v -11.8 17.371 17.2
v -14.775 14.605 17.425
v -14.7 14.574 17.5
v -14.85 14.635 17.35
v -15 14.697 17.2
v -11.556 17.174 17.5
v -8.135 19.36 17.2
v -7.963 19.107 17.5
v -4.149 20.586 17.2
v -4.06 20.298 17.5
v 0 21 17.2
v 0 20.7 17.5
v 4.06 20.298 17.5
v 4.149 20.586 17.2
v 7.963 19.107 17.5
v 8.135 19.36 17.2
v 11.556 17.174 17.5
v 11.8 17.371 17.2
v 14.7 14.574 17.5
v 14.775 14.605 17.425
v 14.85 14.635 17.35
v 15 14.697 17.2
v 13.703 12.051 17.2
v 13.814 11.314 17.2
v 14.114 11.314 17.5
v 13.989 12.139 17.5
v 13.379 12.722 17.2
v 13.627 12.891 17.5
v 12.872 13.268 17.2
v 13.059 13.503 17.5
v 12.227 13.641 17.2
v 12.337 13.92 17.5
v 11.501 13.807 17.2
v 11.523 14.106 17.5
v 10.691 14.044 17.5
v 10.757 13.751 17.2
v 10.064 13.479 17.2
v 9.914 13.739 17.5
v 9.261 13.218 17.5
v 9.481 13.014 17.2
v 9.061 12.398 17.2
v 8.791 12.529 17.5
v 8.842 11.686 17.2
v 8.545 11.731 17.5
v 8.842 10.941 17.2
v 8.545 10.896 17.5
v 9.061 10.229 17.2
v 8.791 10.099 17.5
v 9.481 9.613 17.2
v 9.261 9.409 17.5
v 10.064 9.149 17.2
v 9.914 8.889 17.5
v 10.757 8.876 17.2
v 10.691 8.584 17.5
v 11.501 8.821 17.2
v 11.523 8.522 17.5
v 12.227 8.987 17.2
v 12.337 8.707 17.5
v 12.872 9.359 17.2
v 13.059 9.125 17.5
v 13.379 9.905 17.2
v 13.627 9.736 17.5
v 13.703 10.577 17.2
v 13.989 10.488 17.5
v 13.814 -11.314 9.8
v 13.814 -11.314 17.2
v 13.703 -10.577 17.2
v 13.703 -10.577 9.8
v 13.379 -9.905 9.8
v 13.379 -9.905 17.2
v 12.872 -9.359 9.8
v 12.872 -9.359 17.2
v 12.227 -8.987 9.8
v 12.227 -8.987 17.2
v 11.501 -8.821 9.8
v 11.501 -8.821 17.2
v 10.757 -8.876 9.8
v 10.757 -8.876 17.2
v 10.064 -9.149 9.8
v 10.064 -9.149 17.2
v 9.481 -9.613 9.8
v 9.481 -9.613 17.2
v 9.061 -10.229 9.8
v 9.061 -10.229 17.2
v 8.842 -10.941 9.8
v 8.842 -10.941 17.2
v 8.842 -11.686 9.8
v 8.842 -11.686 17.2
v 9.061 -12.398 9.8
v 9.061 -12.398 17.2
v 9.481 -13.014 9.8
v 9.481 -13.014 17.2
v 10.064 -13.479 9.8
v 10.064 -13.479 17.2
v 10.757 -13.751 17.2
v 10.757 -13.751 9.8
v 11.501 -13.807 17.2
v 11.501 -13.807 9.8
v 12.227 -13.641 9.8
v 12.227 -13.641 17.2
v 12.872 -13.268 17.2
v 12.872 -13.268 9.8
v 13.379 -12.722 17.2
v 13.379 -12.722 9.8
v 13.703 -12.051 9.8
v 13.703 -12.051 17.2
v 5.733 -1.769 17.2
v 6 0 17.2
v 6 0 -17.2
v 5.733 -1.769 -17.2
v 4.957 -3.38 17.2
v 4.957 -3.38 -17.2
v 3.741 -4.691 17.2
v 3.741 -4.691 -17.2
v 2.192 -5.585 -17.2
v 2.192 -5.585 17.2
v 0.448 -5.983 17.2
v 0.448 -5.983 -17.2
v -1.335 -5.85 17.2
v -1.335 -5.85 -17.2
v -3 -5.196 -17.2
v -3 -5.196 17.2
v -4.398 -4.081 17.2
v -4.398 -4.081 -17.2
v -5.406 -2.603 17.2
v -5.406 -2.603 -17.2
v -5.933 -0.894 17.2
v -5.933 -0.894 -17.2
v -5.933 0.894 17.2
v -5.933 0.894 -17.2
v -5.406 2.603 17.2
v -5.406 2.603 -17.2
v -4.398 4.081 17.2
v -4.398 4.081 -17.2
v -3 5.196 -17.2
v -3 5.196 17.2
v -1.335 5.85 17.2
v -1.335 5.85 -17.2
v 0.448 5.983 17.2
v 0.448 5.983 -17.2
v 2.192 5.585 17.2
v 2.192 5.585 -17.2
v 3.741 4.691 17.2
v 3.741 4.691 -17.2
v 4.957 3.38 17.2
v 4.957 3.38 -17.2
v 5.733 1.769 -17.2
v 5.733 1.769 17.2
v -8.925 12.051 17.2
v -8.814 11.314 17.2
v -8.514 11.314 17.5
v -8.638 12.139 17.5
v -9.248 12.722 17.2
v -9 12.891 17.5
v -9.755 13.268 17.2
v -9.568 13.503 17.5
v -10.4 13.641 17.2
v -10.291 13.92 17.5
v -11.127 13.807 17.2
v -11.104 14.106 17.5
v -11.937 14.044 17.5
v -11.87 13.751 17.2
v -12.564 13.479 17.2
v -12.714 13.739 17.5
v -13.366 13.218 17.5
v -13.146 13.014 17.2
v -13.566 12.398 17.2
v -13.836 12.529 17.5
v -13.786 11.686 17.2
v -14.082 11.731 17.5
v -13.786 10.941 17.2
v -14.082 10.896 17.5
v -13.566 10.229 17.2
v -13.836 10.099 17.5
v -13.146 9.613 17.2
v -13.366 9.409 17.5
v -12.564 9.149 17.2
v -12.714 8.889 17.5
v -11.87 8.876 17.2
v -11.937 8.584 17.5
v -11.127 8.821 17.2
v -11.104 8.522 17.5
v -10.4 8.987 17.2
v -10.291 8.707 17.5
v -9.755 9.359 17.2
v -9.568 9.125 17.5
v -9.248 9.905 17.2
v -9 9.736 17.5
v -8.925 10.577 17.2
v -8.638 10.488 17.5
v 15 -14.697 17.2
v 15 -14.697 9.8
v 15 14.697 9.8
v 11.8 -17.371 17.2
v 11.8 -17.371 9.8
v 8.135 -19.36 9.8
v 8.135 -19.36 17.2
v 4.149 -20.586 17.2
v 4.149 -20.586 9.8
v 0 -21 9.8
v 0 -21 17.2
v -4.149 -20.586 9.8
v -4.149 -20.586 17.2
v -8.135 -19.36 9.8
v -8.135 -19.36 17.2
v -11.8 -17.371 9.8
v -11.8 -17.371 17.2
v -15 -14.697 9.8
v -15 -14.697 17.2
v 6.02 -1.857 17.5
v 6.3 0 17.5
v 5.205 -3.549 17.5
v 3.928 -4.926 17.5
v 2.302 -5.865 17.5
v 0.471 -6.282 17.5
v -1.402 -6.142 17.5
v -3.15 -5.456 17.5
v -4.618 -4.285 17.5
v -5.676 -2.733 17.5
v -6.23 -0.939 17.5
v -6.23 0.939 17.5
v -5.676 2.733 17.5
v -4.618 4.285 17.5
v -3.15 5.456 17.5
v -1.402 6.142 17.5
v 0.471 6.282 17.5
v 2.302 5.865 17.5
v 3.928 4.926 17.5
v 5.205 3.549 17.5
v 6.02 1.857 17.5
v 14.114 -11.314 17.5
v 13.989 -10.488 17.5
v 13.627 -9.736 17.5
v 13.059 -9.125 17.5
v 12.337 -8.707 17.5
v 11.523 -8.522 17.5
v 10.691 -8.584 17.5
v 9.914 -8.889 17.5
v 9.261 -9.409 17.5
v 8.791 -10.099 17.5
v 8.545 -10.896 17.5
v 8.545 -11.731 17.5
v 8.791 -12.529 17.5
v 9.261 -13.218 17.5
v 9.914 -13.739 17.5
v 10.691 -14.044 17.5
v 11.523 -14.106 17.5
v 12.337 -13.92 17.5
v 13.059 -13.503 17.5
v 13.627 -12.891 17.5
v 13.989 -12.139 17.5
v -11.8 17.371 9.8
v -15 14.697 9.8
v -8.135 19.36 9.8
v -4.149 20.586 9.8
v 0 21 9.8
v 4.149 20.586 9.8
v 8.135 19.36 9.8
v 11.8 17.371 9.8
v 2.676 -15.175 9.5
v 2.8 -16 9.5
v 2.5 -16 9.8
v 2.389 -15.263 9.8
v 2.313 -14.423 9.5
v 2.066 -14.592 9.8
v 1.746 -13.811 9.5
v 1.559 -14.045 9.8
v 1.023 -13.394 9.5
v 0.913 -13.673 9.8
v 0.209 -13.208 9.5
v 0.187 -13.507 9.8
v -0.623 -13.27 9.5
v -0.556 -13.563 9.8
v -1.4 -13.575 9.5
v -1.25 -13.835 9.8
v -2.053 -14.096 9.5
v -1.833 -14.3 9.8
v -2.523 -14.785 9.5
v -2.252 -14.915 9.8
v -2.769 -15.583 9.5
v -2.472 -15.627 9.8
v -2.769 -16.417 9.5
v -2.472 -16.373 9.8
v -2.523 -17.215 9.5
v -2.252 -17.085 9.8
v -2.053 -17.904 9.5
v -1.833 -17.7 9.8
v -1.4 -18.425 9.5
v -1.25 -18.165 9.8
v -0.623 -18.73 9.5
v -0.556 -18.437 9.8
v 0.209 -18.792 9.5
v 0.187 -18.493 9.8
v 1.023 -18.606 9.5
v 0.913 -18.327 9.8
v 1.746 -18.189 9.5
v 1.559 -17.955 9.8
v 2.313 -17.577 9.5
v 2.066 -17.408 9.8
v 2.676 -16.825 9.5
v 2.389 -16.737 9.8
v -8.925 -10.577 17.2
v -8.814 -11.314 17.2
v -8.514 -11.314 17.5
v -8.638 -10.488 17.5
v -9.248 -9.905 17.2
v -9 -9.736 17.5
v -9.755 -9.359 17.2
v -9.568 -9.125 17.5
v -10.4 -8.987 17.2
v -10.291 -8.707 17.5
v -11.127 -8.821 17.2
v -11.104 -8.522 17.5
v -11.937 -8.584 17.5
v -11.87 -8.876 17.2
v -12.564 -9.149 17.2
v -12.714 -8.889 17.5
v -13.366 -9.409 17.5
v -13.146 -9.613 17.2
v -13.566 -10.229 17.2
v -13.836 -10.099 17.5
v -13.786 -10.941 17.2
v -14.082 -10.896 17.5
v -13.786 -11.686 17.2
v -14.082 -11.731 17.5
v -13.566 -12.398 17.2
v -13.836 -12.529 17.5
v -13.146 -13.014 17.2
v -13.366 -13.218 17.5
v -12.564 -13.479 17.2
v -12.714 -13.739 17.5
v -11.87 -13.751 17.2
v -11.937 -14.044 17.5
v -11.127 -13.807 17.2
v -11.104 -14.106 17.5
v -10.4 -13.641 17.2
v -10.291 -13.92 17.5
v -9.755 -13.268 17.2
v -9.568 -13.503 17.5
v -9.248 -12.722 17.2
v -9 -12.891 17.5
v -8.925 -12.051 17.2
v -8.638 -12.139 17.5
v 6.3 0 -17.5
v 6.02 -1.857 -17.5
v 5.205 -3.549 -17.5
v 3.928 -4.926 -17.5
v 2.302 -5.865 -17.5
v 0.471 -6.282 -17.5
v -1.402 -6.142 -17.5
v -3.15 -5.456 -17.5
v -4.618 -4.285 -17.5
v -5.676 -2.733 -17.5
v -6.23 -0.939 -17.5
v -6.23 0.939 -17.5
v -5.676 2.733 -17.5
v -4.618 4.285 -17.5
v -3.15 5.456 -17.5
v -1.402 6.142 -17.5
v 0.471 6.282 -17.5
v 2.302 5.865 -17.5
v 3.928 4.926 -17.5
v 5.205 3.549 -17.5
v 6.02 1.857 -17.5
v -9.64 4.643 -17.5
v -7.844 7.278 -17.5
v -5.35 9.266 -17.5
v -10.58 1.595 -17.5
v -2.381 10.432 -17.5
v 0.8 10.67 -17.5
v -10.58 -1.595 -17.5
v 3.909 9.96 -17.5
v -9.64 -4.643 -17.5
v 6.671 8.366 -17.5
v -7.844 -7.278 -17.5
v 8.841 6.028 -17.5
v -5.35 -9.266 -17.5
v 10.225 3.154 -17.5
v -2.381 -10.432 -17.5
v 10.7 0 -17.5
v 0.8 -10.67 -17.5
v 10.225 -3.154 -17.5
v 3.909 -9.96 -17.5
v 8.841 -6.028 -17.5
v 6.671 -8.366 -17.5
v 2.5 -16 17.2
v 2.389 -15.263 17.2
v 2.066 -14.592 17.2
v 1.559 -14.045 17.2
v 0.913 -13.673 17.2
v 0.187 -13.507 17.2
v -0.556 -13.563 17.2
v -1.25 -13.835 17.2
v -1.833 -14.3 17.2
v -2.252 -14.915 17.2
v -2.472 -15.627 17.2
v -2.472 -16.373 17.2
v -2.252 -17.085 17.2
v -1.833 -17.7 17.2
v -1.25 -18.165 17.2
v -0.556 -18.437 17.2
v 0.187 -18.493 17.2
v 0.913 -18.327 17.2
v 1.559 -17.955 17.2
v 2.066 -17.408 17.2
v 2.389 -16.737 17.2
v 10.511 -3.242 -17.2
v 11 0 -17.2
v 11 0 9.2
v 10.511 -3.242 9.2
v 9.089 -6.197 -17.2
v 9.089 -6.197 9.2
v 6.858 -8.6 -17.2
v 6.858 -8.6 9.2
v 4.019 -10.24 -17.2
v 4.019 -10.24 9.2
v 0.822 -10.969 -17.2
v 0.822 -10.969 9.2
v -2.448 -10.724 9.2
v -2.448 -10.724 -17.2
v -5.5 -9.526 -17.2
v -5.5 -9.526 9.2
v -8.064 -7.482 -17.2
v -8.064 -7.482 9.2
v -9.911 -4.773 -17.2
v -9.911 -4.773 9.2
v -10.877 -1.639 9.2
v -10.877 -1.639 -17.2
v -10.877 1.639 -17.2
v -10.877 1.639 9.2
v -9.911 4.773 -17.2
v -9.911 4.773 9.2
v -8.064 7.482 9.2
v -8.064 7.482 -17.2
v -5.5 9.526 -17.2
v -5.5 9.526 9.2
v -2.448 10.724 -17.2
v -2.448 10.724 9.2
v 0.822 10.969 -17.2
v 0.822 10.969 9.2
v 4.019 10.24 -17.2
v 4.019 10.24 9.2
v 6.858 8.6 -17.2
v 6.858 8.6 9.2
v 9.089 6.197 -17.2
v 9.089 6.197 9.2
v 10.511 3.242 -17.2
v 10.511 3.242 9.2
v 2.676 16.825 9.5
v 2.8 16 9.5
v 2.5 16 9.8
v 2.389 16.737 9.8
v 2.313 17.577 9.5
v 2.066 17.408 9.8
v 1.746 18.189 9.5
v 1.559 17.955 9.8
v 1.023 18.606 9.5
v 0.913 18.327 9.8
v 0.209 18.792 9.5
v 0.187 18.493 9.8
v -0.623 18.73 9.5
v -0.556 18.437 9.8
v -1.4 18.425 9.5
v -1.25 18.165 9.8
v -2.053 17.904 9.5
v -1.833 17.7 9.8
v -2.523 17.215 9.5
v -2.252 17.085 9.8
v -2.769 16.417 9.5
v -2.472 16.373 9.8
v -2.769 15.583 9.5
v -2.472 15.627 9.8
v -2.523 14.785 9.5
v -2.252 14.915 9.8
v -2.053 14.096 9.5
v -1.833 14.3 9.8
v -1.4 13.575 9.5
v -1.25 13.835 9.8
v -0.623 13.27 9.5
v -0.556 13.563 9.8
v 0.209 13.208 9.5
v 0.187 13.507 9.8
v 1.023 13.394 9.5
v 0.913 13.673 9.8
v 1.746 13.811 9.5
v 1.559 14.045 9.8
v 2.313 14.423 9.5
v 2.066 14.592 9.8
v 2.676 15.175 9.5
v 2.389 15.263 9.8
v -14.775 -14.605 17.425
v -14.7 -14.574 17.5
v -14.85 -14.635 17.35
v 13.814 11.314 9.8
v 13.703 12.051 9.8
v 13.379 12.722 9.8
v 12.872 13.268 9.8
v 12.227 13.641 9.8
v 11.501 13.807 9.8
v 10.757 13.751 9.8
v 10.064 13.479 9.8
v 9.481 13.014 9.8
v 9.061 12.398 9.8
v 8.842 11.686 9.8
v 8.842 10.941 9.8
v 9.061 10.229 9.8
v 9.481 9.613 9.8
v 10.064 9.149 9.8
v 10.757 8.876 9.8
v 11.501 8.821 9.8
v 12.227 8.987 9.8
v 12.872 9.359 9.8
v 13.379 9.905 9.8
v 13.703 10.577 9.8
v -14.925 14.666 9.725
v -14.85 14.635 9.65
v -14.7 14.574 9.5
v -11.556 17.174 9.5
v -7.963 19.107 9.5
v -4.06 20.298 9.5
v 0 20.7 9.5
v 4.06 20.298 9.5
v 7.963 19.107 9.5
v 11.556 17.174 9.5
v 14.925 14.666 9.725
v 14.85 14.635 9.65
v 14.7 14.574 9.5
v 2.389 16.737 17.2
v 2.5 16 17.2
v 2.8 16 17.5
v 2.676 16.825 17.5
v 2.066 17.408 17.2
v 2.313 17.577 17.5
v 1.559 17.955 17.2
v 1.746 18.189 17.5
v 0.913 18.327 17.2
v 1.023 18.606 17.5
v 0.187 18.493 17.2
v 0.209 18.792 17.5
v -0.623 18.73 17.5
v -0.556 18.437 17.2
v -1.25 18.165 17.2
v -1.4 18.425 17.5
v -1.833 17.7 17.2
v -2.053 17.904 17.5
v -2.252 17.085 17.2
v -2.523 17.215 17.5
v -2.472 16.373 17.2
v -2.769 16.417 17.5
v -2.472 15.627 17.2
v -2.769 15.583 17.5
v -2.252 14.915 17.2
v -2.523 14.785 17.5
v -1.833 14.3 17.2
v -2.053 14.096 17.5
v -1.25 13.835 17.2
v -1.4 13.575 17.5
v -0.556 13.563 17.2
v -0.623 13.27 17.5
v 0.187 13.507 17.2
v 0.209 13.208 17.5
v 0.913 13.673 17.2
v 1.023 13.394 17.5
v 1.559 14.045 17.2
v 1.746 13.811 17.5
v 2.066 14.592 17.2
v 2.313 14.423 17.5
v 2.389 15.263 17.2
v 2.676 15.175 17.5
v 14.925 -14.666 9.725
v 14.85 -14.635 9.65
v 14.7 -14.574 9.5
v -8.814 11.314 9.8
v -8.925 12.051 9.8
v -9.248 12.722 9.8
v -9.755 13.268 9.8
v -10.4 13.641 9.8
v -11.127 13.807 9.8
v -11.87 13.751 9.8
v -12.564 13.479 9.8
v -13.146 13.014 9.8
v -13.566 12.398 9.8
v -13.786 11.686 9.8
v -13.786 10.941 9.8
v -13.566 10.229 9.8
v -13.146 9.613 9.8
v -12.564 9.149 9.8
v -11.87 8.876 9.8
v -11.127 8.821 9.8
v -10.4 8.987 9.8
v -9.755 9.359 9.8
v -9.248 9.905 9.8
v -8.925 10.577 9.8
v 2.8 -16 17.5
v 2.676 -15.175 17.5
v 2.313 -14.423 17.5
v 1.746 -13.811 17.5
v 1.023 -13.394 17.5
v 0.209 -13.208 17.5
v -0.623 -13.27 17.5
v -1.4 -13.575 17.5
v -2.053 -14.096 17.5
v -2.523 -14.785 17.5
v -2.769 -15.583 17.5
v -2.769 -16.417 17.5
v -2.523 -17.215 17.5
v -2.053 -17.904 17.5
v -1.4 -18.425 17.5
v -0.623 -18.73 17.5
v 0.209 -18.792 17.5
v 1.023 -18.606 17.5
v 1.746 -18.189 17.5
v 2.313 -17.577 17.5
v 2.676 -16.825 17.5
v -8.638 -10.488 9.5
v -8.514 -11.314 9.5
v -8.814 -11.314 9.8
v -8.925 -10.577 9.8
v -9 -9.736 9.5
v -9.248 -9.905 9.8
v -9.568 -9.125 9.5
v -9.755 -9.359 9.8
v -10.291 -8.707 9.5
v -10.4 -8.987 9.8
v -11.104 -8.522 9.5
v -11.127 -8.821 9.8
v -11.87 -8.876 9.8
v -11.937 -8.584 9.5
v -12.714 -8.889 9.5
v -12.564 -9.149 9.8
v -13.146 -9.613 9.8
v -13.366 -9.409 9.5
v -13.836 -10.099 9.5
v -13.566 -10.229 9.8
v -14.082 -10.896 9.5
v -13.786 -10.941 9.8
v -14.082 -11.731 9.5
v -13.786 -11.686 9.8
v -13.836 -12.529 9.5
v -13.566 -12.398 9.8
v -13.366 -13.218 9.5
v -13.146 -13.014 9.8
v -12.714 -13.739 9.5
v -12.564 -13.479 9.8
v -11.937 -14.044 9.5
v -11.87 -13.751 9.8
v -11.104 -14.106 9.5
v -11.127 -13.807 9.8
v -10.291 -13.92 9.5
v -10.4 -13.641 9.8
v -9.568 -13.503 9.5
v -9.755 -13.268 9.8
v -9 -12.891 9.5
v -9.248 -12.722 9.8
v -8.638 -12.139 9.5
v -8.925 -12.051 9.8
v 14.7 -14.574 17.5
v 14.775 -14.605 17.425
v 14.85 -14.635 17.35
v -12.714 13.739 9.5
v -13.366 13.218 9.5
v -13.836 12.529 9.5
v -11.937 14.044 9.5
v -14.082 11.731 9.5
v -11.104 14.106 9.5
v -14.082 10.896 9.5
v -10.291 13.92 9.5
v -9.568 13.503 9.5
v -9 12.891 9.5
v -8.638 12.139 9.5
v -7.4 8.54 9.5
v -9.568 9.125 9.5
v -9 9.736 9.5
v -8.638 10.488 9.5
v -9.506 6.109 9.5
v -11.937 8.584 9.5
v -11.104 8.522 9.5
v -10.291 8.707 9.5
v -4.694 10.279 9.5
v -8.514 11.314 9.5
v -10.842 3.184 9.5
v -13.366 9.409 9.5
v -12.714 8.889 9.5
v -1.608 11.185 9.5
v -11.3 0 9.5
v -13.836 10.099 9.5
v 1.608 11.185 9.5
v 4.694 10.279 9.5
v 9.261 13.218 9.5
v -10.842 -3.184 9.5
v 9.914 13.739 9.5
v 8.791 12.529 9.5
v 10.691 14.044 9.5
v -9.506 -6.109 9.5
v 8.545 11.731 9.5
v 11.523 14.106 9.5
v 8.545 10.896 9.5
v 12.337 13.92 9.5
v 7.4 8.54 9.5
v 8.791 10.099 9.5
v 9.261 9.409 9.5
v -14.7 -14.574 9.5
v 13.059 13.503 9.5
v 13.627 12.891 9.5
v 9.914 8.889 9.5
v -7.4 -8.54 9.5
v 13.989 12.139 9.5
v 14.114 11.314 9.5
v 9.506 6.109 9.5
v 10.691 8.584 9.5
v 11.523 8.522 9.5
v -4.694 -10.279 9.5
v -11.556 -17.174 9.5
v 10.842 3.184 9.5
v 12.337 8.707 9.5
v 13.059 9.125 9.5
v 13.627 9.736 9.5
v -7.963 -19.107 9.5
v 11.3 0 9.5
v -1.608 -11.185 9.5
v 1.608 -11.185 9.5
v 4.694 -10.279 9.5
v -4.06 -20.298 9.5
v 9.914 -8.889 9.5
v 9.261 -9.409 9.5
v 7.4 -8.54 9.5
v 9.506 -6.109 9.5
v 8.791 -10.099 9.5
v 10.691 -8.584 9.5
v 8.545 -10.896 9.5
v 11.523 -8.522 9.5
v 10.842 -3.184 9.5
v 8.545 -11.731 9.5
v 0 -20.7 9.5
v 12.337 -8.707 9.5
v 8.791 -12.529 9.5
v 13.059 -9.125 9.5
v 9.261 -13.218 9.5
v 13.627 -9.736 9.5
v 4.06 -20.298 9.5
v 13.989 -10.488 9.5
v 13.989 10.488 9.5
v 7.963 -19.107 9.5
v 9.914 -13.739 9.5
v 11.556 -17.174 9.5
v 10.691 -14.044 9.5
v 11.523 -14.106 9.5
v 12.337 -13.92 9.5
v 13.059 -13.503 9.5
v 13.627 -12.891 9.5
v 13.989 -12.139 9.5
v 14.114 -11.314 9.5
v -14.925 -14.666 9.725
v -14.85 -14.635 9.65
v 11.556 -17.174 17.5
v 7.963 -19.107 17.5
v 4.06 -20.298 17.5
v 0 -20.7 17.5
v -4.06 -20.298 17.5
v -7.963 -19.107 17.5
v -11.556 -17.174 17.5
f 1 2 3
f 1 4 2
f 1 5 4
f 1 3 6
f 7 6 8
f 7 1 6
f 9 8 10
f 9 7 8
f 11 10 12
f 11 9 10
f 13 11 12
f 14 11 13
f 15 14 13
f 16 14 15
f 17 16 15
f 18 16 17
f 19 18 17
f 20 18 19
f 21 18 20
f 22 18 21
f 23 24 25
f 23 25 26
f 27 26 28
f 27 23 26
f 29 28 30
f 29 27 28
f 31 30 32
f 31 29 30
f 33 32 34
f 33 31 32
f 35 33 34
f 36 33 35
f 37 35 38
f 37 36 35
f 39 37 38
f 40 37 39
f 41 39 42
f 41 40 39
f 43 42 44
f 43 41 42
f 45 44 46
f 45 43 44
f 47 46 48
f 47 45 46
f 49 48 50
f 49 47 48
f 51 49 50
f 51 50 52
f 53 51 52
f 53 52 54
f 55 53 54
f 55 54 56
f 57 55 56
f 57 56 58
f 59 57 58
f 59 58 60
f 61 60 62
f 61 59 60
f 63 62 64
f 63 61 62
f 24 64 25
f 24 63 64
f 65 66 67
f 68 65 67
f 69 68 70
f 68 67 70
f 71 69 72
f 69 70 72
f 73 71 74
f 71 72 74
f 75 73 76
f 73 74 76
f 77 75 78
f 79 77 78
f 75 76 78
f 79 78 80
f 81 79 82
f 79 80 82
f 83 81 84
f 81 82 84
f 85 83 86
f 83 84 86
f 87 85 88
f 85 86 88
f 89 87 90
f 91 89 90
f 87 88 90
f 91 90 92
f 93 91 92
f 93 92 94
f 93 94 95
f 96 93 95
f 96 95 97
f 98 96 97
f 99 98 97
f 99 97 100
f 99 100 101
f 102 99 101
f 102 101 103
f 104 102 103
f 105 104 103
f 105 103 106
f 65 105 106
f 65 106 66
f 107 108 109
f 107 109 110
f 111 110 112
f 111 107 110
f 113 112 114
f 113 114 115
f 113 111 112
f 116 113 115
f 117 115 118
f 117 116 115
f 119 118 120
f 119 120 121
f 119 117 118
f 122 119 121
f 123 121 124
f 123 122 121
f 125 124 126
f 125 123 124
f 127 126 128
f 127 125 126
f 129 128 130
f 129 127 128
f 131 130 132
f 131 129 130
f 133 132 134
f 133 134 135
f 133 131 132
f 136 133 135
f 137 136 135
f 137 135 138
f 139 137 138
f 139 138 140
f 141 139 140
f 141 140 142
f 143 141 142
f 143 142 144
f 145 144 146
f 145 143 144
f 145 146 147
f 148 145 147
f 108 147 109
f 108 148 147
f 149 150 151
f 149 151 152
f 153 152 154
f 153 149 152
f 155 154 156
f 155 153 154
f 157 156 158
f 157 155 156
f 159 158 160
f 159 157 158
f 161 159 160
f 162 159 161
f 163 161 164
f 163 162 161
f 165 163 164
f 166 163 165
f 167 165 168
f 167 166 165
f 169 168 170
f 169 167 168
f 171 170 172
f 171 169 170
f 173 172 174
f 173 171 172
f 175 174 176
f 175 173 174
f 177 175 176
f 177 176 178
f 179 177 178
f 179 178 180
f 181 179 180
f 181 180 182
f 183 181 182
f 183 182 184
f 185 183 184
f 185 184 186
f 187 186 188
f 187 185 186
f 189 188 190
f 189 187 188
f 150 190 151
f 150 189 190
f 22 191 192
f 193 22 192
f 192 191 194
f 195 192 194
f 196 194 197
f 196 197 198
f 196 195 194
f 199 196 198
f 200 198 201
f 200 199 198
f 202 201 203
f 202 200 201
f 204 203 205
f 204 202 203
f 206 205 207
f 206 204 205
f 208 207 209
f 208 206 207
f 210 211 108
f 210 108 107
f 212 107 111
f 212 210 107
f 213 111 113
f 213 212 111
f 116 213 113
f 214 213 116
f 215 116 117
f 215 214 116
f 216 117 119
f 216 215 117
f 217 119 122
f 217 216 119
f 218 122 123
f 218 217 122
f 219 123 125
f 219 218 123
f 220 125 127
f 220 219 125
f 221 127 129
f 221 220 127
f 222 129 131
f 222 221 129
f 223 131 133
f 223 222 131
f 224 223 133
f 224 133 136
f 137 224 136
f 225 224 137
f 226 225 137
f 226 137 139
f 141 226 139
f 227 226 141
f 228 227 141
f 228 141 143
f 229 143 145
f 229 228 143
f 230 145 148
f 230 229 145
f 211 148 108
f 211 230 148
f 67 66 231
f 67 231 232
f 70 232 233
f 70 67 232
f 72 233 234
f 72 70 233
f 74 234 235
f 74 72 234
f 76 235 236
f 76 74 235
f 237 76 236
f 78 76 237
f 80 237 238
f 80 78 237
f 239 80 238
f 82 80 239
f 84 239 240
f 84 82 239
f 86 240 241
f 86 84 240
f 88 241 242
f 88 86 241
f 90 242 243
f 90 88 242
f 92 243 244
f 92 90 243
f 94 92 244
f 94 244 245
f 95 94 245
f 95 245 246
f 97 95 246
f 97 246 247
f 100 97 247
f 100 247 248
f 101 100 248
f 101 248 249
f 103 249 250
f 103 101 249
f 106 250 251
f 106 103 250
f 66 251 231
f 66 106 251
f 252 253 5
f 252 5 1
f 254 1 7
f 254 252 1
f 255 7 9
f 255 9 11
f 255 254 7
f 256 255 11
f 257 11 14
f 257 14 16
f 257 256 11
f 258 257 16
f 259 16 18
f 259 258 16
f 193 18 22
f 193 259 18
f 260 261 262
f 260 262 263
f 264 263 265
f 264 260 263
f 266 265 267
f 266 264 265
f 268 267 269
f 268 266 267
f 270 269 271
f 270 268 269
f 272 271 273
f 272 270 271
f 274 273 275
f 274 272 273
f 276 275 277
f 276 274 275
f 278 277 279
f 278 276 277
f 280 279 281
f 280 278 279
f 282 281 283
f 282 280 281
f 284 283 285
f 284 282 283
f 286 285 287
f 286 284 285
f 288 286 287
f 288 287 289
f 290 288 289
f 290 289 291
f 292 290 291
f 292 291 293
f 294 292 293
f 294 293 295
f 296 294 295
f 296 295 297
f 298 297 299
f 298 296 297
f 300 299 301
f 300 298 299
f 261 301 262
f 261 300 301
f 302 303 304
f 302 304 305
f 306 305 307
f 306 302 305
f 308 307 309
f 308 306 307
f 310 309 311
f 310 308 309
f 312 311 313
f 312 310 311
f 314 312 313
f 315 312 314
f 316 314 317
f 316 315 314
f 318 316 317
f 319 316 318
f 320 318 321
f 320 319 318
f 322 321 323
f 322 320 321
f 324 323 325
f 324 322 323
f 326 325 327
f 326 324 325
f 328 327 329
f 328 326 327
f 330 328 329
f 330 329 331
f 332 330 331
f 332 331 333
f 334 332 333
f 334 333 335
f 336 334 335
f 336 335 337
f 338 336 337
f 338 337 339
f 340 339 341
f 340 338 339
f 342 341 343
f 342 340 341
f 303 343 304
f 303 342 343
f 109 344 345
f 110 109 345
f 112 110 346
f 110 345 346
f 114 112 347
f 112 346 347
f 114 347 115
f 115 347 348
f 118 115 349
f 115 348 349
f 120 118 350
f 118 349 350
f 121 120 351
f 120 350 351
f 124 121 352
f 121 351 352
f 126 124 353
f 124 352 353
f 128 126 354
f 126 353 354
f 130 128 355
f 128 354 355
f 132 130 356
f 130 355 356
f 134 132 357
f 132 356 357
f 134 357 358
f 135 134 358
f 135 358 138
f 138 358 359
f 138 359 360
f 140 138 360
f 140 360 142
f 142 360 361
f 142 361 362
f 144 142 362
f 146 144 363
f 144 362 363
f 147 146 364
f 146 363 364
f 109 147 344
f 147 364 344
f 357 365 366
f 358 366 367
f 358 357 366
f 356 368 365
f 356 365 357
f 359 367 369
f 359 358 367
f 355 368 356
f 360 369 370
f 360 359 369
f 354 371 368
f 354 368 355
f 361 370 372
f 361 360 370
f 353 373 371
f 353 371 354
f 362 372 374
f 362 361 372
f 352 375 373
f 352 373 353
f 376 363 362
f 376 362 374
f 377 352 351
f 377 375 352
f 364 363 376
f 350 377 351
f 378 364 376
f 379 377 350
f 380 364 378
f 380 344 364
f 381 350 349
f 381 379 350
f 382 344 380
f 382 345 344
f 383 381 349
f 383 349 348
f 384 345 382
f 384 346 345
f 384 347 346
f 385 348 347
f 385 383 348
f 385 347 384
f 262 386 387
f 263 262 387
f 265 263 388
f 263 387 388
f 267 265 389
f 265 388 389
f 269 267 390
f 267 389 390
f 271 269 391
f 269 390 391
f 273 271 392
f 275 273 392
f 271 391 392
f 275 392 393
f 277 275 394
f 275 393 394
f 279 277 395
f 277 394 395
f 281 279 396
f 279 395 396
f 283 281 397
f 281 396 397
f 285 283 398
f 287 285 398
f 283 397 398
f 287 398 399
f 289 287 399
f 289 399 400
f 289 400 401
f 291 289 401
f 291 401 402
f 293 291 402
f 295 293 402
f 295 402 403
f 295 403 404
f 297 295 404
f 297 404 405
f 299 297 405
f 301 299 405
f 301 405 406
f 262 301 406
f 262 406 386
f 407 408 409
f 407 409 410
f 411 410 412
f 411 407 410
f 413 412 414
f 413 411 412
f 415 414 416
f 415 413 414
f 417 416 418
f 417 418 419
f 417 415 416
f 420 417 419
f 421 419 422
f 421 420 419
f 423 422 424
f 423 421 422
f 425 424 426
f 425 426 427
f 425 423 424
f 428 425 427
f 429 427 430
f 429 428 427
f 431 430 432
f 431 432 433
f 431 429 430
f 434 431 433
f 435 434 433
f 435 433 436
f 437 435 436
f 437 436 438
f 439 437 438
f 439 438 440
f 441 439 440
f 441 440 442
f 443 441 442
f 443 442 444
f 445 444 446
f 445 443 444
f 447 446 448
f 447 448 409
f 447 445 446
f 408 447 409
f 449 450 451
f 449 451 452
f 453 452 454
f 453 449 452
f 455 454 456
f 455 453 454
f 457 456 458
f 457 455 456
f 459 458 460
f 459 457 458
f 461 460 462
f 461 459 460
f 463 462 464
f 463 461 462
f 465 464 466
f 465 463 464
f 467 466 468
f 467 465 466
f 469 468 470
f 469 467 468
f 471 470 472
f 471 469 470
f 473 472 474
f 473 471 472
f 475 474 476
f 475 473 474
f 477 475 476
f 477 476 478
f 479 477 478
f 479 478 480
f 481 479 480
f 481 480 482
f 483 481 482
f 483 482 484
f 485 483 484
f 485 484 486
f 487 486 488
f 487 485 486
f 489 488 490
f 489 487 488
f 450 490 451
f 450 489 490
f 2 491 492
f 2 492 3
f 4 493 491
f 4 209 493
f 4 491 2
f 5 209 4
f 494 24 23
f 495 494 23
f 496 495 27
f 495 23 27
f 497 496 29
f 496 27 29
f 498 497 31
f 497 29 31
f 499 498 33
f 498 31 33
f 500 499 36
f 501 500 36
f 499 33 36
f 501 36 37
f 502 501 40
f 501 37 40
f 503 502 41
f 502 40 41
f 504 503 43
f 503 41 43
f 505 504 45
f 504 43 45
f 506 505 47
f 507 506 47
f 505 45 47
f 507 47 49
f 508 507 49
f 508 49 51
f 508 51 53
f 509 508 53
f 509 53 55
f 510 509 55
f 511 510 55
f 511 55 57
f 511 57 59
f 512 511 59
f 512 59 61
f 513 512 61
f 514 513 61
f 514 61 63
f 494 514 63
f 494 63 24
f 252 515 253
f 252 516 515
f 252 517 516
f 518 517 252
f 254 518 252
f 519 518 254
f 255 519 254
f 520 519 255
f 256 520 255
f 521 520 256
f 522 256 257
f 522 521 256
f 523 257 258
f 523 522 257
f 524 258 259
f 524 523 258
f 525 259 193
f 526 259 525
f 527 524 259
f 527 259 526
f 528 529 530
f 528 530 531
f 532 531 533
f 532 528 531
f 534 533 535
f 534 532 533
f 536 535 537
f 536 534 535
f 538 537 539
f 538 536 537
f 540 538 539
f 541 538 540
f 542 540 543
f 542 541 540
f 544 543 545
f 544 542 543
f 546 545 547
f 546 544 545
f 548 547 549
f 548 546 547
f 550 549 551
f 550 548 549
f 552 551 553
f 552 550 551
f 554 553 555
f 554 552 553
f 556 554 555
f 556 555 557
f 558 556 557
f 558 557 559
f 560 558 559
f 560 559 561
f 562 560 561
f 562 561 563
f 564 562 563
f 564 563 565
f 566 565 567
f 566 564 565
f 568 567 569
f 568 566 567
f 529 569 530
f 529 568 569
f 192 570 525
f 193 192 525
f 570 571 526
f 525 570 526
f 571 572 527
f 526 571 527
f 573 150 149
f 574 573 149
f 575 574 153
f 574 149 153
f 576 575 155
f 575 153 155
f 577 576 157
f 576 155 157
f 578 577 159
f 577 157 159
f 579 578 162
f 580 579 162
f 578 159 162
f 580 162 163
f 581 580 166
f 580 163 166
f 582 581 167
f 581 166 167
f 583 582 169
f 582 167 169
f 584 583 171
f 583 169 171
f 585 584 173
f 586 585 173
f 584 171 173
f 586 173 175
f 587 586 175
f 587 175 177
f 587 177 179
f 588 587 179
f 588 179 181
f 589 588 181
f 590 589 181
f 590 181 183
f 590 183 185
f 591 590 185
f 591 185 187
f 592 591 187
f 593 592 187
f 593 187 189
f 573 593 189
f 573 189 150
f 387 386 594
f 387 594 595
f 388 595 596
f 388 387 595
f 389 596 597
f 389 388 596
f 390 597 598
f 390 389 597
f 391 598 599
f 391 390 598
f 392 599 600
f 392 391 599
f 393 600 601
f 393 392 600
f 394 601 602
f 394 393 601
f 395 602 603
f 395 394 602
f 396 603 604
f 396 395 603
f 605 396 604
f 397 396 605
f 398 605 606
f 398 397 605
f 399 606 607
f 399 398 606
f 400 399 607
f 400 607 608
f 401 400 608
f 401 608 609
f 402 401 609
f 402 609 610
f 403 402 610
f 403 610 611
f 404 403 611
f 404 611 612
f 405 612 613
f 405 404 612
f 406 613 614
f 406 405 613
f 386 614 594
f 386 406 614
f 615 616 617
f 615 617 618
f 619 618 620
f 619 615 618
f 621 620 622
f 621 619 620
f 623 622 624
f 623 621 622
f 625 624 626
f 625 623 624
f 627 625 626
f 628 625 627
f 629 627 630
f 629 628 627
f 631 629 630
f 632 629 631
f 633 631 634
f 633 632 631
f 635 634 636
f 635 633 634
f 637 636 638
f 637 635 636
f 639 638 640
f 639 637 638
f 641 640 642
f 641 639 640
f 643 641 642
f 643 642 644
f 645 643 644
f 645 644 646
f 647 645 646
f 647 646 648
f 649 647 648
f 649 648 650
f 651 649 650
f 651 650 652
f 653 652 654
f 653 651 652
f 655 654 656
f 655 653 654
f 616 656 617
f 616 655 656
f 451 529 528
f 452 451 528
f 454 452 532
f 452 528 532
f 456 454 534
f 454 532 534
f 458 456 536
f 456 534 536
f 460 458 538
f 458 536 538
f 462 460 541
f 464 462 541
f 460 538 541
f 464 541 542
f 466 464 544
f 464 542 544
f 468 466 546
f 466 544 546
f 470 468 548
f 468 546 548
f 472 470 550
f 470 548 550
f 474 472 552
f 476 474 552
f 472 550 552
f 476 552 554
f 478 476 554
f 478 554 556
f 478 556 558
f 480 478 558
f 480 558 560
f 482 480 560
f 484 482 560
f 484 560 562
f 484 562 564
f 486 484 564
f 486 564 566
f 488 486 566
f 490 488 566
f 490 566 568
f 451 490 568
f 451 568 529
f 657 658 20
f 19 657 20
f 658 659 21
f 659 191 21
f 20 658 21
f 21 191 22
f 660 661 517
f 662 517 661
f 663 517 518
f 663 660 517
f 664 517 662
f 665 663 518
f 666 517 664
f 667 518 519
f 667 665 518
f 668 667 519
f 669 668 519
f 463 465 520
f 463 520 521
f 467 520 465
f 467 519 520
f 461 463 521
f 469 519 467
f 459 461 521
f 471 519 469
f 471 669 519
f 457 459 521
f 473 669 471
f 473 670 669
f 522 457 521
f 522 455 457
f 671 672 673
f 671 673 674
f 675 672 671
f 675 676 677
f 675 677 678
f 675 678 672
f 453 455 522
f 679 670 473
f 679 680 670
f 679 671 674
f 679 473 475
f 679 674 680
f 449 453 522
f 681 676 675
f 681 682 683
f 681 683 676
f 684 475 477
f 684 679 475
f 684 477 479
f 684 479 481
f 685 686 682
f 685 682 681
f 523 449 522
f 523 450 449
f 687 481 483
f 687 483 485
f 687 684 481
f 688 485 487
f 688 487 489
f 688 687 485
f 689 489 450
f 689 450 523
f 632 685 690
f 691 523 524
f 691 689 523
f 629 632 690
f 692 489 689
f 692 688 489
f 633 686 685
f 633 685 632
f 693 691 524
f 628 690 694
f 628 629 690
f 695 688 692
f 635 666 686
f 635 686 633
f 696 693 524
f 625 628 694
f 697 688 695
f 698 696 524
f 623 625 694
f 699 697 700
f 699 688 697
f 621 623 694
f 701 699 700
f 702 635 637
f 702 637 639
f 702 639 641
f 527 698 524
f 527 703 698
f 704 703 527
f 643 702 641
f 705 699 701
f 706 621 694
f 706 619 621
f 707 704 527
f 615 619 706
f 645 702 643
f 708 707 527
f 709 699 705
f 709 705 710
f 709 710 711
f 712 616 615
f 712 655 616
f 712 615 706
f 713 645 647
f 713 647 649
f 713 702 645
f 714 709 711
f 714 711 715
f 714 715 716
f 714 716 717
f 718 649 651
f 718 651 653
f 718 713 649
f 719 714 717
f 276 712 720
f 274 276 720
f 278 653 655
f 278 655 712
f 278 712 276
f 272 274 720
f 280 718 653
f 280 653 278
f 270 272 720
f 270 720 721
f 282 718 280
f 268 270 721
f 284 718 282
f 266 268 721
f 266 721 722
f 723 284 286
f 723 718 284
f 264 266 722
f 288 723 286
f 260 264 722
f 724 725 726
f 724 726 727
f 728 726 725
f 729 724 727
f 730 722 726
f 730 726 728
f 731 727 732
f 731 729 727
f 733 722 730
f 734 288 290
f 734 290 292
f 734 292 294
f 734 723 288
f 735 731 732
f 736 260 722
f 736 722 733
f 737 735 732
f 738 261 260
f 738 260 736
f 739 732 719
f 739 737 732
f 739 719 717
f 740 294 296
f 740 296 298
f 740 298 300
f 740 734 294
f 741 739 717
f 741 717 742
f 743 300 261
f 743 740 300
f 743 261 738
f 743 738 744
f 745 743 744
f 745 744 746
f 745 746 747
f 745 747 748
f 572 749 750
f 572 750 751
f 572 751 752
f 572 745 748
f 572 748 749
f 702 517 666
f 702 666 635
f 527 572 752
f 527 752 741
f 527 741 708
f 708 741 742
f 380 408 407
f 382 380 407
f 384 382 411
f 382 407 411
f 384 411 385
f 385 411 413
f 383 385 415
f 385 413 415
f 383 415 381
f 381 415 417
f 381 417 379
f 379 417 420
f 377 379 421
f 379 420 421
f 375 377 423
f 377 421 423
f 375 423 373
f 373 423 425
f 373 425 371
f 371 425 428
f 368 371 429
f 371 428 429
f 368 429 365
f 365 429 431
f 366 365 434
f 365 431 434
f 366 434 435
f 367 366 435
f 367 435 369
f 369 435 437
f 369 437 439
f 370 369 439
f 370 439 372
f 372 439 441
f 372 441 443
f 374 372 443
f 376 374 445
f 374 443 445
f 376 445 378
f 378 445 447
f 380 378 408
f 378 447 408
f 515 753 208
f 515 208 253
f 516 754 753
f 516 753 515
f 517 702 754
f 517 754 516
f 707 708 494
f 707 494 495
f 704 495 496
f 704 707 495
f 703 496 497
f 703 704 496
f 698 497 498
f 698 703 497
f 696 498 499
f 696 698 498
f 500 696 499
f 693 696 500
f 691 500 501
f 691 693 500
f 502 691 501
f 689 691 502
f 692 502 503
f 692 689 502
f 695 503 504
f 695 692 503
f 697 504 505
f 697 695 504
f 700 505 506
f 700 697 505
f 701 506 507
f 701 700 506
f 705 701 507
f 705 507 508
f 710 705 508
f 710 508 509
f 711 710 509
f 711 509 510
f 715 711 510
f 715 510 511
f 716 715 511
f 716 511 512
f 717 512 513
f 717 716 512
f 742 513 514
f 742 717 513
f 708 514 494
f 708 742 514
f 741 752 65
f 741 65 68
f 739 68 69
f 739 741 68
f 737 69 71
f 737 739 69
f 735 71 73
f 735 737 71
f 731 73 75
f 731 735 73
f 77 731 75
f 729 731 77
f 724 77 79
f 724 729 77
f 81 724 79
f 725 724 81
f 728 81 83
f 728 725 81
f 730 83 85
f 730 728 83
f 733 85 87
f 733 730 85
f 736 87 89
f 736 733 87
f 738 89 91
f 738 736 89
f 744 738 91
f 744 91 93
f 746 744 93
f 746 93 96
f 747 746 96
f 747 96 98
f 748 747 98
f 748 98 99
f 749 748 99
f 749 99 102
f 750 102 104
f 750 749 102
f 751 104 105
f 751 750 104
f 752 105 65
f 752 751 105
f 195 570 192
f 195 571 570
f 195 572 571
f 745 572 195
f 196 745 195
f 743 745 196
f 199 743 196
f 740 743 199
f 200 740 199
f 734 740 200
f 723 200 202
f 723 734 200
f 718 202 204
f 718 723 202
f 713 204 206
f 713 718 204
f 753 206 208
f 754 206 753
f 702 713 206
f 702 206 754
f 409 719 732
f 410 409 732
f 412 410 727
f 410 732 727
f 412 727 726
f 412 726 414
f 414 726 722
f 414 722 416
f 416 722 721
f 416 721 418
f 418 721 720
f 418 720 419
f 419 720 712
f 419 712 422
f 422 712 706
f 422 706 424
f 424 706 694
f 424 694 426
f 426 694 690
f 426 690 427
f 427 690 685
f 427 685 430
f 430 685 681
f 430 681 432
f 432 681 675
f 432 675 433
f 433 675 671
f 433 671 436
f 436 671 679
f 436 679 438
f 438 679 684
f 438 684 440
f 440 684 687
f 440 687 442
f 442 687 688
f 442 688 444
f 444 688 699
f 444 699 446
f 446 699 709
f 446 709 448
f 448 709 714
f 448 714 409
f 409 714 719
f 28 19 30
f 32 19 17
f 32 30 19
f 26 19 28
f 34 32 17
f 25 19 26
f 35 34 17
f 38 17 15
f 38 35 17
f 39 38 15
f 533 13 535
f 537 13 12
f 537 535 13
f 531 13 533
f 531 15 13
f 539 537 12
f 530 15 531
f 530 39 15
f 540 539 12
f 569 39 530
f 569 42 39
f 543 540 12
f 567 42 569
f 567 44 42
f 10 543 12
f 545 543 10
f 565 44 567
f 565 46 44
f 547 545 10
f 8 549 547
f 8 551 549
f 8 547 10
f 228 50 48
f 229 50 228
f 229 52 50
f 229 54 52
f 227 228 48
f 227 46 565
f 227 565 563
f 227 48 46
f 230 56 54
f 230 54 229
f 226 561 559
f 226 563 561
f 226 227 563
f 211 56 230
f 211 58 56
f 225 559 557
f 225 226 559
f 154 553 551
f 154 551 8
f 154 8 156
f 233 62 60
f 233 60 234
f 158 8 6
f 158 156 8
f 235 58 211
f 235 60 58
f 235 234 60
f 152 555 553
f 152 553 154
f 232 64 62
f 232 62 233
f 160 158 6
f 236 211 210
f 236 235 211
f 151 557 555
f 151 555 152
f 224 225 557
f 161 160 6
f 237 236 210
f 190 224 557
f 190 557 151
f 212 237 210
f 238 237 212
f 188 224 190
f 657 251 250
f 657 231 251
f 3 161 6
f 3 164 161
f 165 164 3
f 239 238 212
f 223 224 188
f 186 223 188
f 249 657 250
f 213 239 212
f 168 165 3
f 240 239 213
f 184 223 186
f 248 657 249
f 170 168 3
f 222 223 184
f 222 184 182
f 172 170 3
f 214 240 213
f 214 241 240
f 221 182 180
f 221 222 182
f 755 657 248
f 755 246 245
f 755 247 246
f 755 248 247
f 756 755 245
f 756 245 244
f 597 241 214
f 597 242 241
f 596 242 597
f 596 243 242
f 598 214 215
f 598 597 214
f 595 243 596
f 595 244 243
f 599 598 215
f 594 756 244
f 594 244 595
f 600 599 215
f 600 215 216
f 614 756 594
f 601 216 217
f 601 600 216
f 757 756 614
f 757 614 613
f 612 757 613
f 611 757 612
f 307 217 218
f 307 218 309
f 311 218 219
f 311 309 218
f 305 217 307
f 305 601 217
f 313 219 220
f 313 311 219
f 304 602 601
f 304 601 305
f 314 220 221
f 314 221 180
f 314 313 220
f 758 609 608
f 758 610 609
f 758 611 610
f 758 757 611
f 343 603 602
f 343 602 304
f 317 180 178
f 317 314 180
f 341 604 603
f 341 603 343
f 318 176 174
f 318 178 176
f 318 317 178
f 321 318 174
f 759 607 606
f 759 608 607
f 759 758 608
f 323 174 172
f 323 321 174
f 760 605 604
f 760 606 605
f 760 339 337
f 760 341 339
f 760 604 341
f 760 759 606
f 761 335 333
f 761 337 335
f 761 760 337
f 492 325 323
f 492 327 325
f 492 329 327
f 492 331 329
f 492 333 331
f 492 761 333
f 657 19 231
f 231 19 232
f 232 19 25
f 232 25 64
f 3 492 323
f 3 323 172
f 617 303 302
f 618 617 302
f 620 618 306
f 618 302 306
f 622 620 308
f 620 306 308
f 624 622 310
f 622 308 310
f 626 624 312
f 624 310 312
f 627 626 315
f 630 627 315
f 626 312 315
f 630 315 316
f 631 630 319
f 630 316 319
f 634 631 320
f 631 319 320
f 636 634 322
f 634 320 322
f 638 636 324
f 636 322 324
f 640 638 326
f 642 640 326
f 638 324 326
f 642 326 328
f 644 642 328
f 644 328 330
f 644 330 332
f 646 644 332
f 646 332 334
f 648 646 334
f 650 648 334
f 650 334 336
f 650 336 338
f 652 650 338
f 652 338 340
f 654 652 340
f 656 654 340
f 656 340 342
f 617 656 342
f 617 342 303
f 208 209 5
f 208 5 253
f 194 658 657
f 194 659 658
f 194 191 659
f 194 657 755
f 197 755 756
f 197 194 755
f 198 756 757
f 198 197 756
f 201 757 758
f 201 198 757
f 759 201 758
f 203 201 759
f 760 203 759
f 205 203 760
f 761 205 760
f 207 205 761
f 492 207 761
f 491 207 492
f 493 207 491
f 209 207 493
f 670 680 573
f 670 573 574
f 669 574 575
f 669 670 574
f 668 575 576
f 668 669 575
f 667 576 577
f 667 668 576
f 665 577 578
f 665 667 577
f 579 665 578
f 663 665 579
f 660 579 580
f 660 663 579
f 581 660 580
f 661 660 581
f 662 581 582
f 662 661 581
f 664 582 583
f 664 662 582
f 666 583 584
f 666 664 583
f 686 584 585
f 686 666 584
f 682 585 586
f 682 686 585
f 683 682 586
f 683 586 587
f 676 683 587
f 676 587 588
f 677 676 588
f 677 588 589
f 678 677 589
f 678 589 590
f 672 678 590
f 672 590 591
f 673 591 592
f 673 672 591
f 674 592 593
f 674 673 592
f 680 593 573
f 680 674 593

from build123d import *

# Parameters (mm, degrees)
CUT_EXTRUDE1_DEPTH      = 35.471002306
CUT_EXTRUDE1_DEPTH_BACK = 35.471002306
SKETCH2_W               = 6
SKETCH2_H               = 8
SKETCH3_R               = 2.5
CUT_EXTRUDE2_DEPTH      = 10
CHAMFER1_SIZE           = 0.3


with BuildPart() as part:
    # Sketch1 → Revolve1 (revolve)
    with BuildSketch(Plane(origin=(0, 0, 0), x_dir=(0, 0, -1), z_dir=(1, 0, 0)), mode=Mode.PRIVATE) as revolve1_sk:
        Polygon((17.5, 6), (-17.5, 6), (-17.5, 21), (-9.5, 21), (-9.5, 11), (17.5, 11), align=None)
    revolve(revolve1_sk.sketch.rotate(Axis((0, 0, 27), (0, 0, -1)), 90), axis=Axis((0, 0, 27), (0, 0, -1)))

    # Sketch2 → Cut-Extrude1 (cut, two sides: drawn at the far end of the back side and taken through both)
    with BuildSketch(Plane(origin=(0, 0, 0), x_dir=(1, 0, 0), z_dir=(0, 1, 0)).offset(-CUT_EXTRUDE1_DEPTH_BACK)):
        with Locations((-18, -13.5)):
            Rectangle(SKETCH2_W, SKETCH2_H)
        with Locations((18, -13.5)):
            Rectangle(SKETCH2_W, SKETCH2_H)
    extrude(amount=CUT_EXTRUDE1_DEPTH + CUT_EXTRUDE1_DEPTH_BACK, mode=Mode.SUBTRACT)

    # Sketch3 → Cut-Extrude2 (cut)
    with BuildSketch(Plane.XY.offset(17.5)):
        with Locations((0, 16)):
            Circle(SKETCH3_R)
        with Locations((11.313708499, 11.313708499)):
            Circle(SKETCH3_R)
        with Locations((11.313708499, -11.313708499)):
            Circle(SKETCH3_R)
        with Locations((0, -16)):
            Circle(SKETCH3_R)
        with Locations((-11.313708499, -11.313708499)):
            Circle(SKETCH3_R)
        with Locations((-11.313708499, 11.313708499)):
            Circle(SKETCH3_R)
    extrude(amount=-CUT_EXTRUDE2_DEPTH, mode=Mode.SUBTRACT)

    # Chamfer1
    chamfer1_edges = [part.edges().sort_by_distance(p)[0] for p in [
        (0, -21, 9.5),
        (-15, 0, 9.5),
        (0, -21, 17.5),
        (-15, 0, 17.5),
        (0, 21, 9.5),
        (15, 0, 9.5),
        (0, 21, 17.5),
        (15, 0, 17.5),
        (-11, 0, -17.5),
        (-11, 0, 9.5),
        (-2.5, 16, 9.5),
        (-2.5, 16, 17.5),
        (8.813708499, 11.313708499, 9.5),
        (-6, 0, 17.5),
        (8.813708499, 11.313708499, 17.5),
        (8.813708499, -11.313708499, 9.5),
        (8.813708499, -11.313708499, 17.5),
        (-2.5, -16, 9.5),
        (-6, 0, -17.5),
        (-2.5, -16, 17.5),
        (-13.813708499, -11.313708499, 9.5),
        (-13.813708499, -11.313708499, 17.5),
        (-13.813708499, 11.313708499, 9.5),
        (-13.813708499, 11.313708499, 17.5),
    ]]
    chamfer(chamfer1_edges, length=CHAMFER1_SIZE)


solid = part.part
